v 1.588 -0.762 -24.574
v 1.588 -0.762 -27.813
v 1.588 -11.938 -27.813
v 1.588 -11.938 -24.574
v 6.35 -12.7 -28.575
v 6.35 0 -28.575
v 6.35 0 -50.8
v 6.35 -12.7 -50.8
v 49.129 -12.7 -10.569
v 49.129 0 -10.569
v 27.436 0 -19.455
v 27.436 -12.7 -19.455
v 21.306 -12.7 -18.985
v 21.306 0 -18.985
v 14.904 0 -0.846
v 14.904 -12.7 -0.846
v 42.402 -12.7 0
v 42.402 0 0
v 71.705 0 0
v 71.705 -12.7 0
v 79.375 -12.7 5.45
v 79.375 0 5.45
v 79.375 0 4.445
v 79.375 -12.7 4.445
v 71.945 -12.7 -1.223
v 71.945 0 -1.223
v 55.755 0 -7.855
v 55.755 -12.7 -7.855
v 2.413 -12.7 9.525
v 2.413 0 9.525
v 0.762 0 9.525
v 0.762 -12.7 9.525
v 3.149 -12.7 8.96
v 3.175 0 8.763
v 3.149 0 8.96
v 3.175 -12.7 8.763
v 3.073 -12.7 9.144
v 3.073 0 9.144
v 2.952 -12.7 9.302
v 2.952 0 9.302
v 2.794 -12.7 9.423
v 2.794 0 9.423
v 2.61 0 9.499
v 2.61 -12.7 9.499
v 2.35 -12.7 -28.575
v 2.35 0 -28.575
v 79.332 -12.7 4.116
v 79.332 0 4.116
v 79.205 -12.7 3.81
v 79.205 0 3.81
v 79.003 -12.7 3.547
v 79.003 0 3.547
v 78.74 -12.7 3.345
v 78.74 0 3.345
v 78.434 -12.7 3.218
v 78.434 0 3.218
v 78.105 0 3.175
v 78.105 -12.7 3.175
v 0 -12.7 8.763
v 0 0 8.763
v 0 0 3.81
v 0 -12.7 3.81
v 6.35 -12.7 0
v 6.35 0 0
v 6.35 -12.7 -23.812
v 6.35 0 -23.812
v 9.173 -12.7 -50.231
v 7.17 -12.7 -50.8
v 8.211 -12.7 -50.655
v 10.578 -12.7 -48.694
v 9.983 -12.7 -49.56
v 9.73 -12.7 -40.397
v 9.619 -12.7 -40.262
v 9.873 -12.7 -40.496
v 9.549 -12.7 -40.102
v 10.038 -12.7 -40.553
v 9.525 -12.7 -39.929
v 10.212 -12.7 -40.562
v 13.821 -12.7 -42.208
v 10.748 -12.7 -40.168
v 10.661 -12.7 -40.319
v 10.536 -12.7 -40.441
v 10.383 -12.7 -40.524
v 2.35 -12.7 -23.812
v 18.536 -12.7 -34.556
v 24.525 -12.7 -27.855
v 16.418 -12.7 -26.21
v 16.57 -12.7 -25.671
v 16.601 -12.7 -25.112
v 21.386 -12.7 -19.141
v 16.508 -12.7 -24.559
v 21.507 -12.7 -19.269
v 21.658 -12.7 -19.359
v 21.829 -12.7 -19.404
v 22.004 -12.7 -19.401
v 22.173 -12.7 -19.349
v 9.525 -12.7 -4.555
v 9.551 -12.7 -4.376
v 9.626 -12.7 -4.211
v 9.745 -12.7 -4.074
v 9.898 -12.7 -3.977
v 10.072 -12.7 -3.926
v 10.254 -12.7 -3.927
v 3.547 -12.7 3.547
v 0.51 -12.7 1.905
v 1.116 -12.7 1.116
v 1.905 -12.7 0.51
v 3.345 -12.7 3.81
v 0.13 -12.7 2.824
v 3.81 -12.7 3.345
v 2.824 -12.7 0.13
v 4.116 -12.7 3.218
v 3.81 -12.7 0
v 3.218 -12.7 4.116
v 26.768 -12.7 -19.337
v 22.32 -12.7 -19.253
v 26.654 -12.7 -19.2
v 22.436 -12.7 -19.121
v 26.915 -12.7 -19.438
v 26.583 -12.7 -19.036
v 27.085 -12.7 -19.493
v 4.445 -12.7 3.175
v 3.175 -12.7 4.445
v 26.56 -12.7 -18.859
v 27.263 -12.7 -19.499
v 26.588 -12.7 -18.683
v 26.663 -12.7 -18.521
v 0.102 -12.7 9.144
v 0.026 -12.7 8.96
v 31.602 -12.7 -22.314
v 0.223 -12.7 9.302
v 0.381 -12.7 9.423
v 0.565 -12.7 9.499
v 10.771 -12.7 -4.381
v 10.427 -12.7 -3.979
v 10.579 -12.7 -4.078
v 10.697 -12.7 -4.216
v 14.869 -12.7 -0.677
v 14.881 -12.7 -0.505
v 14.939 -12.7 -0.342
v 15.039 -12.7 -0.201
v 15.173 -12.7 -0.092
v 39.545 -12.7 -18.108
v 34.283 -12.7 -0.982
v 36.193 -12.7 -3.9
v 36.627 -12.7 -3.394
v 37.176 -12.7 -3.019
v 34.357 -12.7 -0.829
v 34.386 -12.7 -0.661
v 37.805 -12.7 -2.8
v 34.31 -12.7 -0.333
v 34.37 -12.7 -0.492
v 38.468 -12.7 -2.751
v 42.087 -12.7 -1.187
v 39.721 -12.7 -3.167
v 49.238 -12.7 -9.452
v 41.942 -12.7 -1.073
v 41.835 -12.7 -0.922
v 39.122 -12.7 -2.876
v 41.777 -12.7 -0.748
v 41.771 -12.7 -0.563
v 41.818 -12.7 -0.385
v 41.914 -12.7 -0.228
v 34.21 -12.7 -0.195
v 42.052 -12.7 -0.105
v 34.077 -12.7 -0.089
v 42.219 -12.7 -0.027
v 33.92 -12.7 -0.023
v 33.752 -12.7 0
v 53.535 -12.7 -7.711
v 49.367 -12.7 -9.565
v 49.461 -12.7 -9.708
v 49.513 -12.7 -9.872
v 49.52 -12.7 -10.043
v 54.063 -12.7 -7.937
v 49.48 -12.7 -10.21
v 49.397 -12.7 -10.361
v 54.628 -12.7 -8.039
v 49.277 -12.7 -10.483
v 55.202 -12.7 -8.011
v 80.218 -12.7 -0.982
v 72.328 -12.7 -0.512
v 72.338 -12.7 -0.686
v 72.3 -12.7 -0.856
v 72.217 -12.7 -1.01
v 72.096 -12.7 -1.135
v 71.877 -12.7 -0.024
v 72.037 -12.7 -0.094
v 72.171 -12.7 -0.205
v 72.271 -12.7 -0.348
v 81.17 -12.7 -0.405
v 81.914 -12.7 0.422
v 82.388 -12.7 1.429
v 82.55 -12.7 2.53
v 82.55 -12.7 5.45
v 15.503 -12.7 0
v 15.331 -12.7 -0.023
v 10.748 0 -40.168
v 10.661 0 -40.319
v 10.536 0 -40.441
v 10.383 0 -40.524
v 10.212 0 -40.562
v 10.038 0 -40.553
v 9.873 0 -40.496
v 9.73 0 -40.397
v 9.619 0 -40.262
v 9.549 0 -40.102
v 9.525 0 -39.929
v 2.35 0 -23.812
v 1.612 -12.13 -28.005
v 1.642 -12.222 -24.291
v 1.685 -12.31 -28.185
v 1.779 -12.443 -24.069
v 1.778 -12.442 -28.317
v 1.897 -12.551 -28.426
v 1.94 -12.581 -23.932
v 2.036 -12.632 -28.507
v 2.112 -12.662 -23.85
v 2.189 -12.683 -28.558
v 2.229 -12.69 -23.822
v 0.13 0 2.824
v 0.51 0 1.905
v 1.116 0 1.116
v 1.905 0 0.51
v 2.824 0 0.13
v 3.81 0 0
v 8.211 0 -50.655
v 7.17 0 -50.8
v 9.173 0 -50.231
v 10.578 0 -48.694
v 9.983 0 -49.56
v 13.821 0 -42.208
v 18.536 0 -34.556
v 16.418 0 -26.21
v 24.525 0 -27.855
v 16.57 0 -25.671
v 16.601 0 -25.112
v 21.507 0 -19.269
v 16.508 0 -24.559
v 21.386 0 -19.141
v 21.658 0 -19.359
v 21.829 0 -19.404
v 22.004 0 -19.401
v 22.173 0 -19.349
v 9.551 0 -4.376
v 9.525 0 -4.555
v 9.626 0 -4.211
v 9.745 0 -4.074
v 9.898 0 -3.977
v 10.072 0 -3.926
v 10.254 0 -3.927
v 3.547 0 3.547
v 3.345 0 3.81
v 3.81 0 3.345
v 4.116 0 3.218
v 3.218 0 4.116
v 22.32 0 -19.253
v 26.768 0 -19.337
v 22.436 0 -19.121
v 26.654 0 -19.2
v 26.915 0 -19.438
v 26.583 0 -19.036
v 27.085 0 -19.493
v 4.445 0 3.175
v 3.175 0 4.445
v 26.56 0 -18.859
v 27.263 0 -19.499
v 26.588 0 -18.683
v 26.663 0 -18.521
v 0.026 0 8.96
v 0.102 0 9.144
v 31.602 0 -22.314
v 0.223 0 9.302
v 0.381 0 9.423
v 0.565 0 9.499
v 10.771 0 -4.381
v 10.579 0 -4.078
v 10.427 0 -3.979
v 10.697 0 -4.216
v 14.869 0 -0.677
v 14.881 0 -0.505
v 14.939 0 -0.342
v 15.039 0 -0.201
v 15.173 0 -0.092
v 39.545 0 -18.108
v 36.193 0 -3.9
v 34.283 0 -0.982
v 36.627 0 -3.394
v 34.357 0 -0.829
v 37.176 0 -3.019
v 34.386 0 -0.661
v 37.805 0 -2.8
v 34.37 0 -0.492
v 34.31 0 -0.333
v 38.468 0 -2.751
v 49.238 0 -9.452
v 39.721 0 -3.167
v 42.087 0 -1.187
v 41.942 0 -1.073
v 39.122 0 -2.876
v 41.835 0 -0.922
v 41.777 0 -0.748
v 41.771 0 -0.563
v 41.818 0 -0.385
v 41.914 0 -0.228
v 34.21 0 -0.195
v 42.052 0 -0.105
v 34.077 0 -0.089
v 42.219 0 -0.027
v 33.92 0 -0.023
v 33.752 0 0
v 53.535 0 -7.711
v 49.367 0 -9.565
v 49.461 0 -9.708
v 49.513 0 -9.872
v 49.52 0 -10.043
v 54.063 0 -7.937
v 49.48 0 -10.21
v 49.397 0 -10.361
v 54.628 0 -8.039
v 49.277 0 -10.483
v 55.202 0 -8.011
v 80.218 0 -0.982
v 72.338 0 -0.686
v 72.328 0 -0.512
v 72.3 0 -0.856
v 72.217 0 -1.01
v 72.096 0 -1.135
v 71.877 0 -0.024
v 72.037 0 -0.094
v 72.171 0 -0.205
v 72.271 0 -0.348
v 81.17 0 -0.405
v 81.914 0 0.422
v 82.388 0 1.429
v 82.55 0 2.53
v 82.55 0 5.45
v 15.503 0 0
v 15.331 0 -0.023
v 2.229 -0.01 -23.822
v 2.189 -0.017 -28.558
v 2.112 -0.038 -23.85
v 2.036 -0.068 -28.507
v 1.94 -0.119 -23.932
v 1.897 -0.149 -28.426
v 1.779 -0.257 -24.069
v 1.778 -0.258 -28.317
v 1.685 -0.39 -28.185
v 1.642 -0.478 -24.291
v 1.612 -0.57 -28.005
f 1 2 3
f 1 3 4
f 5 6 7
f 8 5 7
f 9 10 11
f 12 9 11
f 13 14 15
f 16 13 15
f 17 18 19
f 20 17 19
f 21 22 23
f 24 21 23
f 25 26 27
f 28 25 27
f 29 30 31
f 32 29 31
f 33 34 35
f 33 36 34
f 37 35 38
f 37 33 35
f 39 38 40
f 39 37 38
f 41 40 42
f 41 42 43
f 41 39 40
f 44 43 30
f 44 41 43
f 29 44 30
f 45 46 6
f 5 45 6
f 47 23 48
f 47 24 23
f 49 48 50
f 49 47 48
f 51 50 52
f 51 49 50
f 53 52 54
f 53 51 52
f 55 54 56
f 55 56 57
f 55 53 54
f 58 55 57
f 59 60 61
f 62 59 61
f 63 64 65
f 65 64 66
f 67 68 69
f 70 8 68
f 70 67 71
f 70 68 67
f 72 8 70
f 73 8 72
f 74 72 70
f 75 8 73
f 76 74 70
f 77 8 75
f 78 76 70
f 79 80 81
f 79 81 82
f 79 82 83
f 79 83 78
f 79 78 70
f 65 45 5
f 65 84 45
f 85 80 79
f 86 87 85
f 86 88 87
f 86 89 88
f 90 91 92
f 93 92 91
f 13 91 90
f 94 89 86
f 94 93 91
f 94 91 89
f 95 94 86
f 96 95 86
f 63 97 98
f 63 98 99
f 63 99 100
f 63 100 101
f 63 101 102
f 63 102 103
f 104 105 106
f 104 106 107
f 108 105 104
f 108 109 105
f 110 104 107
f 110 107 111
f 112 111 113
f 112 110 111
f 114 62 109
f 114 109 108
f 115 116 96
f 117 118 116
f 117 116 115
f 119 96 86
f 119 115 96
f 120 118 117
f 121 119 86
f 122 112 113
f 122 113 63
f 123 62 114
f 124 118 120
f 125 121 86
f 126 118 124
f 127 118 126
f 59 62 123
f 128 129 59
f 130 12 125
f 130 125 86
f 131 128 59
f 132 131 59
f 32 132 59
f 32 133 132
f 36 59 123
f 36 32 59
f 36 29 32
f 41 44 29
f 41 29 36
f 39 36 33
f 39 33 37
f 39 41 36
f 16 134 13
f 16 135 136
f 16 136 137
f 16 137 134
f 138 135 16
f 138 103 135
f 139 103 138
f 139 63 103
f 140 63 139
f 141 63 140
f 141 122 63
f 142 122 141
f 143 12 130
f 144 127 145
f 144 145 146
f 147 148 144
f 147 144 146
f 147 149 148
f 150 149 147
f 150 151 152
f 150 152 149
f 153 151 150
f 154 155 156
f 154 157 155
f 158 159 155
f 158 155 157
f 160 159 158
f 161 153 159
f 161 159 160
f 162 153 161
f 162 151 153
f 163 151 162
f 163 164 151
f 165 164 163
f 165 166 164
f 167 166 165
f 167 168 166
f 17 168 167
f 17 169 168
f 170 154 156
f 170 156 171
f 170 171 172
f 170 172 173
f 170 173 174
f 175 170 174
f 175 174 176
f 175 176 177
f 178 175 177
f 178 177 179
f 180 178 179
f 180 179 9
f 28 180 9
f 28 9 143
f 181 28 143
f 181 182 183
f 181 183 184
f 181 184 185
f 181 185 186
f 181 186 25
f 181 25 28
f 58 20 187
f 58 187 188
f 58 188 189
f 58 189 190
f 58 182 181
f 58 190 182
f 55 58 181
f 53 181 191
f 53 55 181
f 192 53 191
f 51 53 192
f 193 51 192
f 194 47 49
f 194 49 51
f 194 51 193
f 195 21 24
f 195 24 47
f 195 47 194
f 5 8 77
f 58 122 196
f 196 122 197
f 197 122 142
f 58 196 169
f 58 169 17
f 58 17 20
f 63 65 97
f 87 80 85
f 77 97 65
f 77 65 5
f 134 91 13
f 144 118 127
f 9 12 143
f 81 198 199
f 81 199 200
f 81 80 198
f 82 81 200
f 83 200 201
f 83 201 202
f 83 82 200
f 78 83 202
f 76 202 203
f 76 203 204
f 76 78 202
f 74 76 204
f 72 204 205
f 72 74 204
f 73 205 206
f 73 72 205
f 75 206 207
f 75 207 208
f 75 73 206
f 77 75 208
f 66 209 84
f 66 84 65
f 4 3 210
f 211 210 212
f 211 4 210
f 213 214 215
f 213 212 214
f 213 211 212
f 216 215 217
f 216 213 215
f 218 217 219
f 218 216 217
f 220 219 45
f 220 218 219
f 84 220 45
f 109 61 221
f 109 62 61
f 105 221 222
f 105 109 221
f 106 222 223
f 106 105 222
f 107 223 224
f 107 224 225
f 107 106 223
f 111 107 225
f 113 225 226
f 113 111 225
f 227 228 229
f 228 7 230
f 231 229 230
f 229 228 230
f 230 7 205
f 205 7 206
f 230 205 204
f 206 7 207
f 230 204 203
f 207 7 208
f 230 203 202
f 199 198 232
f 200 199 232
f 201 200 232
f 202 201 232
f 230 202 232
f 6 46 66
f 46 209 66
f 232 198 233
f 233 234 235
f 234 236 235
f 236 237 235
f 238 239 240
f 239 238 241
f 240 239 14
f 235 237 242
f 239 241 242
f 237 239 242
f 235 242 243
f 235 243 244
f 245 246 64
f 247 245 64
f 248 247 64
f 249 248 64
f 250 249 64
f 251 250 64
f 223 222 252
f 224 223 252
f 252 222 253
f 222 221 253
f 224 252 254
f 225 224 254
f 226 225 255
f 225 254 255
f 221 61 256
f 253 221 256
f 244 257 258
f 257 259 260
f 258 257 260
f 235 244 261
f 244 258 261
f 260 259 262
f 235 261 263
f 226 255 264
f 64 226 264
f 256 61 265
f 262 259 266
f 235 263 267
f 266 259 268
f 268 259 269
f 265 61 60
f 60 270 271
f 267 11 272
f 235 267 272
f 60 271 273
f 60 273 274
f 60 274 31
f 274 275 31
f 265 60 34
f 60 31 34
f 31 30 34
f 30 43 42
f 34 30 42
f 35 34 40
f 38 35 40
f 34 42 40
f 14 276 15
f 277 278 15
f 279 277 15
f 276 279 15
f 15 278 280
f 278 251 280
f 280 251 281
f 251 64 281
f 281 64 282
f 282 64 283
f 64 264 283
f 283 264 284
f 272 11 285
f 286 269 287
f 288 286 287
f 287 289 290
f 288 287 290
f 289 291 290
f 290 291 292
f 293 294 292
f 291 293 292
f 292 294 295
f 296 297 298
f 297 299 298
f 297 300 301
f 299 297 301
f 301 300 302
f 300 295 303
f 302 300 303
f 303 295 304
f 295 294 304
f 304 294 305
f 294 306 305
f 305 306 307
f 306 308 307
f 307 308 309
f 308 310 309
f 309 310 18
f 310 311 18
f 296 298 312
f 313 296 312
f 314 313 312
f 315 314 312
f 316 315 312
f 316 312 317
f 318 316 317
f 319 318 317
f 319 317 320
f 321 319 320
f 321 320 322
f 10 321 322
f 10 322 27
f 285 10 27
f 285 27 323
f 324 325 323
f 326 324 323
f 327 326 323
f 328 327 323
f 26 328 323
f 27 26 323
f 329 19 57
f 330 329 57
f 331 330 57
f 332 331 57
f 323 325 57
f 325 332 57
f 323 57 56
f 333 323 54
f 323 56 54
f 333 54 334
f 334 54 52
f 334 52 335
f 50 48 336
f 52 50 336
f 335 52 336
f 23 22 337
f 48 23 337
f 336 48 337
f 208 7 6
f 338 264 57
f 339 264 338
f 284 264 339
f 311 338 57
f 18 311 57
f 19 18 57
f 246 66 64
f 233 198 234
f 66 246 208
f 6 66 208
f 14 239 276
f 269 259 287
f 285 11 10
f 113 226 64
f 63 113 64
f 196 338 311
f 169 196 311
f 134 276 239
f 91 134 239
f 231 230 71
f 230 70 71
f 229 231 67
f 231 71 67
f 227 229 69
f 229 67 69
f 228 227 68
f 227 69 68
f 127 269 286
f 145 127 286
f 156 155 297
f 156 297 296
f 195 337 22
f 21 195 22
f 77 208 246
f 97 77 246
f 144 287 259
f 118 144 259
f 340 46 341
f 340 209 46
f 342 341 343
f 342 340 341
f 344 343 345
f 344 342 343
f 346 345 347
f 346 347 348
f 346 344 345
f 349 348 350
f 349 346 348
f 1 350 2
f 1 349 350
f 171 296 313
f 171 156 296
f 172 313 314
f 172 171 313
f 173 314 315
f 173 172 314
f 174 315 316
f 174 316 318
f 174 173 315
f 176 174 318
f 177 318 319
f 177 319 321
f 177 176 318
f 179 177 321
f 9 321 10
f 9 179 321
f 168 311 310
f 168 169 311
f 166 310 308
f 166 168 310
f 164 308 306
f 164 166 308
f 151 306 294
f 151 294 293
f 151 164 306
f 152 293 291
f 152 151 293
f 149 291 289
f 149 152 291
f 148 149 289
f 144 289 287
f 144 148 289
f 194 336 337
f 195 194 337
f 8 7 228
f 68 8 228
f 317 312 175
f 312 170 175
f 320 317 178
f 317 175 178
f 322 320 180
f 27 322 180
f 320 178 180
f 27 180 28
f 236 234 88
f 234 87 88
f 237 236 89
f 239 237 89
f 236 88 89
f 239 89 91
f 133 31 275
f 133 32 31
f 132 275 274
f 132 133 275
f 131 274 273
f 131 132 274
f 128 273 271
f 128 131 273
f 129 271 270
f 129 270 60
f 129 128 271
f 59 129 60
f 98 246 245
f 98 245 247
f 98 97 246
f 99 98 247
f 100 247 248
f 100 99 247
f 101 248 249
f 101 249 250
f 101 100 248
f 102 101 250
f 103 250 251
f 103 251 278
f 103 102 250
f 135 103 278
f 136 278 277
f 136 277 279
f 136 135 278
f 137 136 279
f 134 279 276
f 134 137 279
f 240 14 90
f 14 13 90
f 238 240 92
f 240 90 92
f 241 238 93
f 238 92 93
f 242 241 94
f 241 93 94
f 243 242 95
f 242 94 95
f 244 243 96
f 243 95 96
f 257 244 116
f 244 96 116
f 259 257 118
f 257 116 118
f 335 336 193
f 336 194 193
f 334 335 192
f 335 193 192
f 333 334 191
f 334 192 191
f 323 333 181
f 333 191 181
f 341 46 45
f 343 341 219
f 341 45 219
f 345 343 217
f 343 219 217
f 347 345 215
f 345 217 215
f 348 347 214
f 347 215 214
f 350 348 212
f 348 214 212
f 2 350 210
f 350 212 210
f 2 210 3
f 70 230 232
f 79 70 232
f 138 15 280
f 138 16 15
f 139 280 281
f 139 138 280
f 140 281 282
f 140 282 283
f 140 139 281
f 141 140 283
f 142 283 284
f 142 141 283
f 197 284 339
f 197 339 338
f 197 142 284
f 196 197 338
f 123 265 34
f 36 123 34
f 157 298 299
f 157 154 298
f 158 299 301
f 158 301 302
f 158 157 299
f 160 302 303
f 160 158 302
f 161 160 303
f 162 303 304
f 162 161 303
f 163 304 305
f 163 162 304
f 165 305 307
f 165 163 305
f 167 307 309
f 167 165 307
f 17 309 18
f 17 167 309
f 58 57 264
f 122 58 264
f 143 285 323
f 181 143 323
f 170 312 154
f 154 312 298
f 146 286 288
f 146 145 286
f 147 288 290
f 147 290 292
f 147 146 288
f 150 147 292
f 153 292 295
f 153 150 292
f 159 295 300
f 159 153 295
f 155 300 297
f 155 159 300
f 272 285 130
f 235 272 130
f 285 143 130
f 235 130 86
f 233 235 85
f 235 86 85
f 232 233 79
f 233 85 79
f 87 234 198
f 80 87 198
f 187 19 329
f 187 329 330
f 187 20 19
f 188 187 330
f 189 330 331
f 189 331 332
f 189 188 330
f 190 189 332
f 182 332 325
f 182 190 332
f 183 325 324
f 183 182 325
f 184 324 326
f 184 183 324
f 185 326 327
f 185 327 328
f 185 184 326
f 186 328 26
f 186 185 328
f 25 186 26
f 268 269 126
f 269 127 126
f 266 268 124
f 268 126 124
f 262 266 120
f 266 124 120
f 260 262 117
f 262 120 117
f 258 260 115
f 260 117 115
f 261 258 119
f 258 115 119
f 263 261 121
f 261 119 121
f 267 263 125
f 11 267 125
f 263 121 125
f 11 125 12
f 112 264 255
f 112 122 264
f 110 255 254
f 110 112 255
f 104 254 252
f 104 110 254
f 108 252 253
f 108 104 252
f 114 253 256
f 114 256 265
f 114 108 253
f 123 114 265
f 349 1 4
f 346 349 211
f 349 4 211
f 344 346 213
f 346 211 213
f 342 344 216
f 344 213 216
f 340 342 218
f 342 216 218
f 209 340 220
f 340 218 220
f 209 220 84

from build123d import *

# Parameters (mm, degrees)
F0_W     = 4.7625
F0_H     = 4.7625
F1_DEPTH = 12.7
F2_R     = 1.27
F3_R     = 3.81
F4_R     = 50.8
F5_R     = 0.635
F6_R     = 2.54
F7_R     = 0.762


with BuildPart() as f1:
    # F0 (on Front) → F1 (new body)
    with BuildSketch(Plane.XZ):
        Polygon((3.175, 9.525), (0, 9.525), (0, 0), (6.35, 0), (6.35, -23.8125), (6.35, -28.575), (6.35, -50.8), (9.525, -50.8), (22.225, -25.4), (82.55, 0), (82.55, 5.450216), (79.375, 5.450216), (79.375, 3.175), (3.175, 3.175), align=None)
        Polygon((9.525, -43.18), (9.525, 0), (16.747011, -25.4), align=None, mode=Mode.SUBTRACT)
        Polygon((14.605, 0), (34.925, 0), (21.733211, -20.196598), align=None, mode=Mode.SUBTRACT)
        Polygon((37.588557, -1.75892), (50.240452, -10.113791), (25.550904, -20.227582), align=None, mode=Mode.SUBTRACT)
        Polygon((40.005, 0), (74.93, 0), (54.61, -8.323855), align=None, mode=Mode.SUBTRACT)
        with Locations((3.96875, -26.19375)):
            Rectangle(F0_W, F0_H)
    extrude(amount=F1_DEPTH)

    # F2
    f2_edges = [f1.edges().sort_by_distance(p)[0] for p in [
        (79.375, -6.35, 3.175),
        (3.175, -6.35, 3.175),
    ]]
    fillet(f2_edges, radius=F2_R)

    # F3
    f3_edges = [f1.edges().sort_by_distance(p)[0] for p in [
        (82.55, -6.35, 0),
        (0, -6.35, 0),
        (9.525, -6.35, -50.8),
    ]]
    fillet(f3_edges, radius=F3_R)

    # F4
    f4_edges = [f1.edges().sort_by_distance(p)[0] for p in [
        (22.225, -6.35, -25.4),
    ]]
    fillet(f4_edges, radius=F4_R)

    # F5
    f5_edges = [f1.edges().sort_by_distance(p)[0] for p in [
        (74.93, -6.35, 0),
        (25.550904, -6.35, -20.227582),
        (50.240452, -6.35, -10.113791),
        (9.525, -6.35, 0),
        (9.525, -6.35, -43.18),
        (14.605, -6.35, 0),
        (34.925, -6.35, 0),
        (40.005, -6.35, 0),
        (21.733211, -6.35, -20.196598),
    ]]
    fillet(f5_edges, radius=F5_R)

    # F6
    f6_edges = [f1.edges().sort_by_distance(p)[0] for p in [
        (16.747011, -6.35, -25.4),
        (37.588557, -6.35, -1.75892),
        (54.61, -6.35, -8.323855),
    ]]
    fillet(f6_edges, radius=F6_R)

    # F7
    f7_edges = [f1.edges().sort_by_distance(p)[0] for p in [
        (0, -6.35, 9.525),
        (3.175, -6.35, 9.525),
        (1.5875, -6.35, -23.8125),
        (1.5875, -6.35, -28.575),
        (1.5875, -12.7, -26.19375),
        (1.5875, 0, -26.19375),
    ]]
    fillet(f7_edges, radius=F7_R)


solid = f1.part
